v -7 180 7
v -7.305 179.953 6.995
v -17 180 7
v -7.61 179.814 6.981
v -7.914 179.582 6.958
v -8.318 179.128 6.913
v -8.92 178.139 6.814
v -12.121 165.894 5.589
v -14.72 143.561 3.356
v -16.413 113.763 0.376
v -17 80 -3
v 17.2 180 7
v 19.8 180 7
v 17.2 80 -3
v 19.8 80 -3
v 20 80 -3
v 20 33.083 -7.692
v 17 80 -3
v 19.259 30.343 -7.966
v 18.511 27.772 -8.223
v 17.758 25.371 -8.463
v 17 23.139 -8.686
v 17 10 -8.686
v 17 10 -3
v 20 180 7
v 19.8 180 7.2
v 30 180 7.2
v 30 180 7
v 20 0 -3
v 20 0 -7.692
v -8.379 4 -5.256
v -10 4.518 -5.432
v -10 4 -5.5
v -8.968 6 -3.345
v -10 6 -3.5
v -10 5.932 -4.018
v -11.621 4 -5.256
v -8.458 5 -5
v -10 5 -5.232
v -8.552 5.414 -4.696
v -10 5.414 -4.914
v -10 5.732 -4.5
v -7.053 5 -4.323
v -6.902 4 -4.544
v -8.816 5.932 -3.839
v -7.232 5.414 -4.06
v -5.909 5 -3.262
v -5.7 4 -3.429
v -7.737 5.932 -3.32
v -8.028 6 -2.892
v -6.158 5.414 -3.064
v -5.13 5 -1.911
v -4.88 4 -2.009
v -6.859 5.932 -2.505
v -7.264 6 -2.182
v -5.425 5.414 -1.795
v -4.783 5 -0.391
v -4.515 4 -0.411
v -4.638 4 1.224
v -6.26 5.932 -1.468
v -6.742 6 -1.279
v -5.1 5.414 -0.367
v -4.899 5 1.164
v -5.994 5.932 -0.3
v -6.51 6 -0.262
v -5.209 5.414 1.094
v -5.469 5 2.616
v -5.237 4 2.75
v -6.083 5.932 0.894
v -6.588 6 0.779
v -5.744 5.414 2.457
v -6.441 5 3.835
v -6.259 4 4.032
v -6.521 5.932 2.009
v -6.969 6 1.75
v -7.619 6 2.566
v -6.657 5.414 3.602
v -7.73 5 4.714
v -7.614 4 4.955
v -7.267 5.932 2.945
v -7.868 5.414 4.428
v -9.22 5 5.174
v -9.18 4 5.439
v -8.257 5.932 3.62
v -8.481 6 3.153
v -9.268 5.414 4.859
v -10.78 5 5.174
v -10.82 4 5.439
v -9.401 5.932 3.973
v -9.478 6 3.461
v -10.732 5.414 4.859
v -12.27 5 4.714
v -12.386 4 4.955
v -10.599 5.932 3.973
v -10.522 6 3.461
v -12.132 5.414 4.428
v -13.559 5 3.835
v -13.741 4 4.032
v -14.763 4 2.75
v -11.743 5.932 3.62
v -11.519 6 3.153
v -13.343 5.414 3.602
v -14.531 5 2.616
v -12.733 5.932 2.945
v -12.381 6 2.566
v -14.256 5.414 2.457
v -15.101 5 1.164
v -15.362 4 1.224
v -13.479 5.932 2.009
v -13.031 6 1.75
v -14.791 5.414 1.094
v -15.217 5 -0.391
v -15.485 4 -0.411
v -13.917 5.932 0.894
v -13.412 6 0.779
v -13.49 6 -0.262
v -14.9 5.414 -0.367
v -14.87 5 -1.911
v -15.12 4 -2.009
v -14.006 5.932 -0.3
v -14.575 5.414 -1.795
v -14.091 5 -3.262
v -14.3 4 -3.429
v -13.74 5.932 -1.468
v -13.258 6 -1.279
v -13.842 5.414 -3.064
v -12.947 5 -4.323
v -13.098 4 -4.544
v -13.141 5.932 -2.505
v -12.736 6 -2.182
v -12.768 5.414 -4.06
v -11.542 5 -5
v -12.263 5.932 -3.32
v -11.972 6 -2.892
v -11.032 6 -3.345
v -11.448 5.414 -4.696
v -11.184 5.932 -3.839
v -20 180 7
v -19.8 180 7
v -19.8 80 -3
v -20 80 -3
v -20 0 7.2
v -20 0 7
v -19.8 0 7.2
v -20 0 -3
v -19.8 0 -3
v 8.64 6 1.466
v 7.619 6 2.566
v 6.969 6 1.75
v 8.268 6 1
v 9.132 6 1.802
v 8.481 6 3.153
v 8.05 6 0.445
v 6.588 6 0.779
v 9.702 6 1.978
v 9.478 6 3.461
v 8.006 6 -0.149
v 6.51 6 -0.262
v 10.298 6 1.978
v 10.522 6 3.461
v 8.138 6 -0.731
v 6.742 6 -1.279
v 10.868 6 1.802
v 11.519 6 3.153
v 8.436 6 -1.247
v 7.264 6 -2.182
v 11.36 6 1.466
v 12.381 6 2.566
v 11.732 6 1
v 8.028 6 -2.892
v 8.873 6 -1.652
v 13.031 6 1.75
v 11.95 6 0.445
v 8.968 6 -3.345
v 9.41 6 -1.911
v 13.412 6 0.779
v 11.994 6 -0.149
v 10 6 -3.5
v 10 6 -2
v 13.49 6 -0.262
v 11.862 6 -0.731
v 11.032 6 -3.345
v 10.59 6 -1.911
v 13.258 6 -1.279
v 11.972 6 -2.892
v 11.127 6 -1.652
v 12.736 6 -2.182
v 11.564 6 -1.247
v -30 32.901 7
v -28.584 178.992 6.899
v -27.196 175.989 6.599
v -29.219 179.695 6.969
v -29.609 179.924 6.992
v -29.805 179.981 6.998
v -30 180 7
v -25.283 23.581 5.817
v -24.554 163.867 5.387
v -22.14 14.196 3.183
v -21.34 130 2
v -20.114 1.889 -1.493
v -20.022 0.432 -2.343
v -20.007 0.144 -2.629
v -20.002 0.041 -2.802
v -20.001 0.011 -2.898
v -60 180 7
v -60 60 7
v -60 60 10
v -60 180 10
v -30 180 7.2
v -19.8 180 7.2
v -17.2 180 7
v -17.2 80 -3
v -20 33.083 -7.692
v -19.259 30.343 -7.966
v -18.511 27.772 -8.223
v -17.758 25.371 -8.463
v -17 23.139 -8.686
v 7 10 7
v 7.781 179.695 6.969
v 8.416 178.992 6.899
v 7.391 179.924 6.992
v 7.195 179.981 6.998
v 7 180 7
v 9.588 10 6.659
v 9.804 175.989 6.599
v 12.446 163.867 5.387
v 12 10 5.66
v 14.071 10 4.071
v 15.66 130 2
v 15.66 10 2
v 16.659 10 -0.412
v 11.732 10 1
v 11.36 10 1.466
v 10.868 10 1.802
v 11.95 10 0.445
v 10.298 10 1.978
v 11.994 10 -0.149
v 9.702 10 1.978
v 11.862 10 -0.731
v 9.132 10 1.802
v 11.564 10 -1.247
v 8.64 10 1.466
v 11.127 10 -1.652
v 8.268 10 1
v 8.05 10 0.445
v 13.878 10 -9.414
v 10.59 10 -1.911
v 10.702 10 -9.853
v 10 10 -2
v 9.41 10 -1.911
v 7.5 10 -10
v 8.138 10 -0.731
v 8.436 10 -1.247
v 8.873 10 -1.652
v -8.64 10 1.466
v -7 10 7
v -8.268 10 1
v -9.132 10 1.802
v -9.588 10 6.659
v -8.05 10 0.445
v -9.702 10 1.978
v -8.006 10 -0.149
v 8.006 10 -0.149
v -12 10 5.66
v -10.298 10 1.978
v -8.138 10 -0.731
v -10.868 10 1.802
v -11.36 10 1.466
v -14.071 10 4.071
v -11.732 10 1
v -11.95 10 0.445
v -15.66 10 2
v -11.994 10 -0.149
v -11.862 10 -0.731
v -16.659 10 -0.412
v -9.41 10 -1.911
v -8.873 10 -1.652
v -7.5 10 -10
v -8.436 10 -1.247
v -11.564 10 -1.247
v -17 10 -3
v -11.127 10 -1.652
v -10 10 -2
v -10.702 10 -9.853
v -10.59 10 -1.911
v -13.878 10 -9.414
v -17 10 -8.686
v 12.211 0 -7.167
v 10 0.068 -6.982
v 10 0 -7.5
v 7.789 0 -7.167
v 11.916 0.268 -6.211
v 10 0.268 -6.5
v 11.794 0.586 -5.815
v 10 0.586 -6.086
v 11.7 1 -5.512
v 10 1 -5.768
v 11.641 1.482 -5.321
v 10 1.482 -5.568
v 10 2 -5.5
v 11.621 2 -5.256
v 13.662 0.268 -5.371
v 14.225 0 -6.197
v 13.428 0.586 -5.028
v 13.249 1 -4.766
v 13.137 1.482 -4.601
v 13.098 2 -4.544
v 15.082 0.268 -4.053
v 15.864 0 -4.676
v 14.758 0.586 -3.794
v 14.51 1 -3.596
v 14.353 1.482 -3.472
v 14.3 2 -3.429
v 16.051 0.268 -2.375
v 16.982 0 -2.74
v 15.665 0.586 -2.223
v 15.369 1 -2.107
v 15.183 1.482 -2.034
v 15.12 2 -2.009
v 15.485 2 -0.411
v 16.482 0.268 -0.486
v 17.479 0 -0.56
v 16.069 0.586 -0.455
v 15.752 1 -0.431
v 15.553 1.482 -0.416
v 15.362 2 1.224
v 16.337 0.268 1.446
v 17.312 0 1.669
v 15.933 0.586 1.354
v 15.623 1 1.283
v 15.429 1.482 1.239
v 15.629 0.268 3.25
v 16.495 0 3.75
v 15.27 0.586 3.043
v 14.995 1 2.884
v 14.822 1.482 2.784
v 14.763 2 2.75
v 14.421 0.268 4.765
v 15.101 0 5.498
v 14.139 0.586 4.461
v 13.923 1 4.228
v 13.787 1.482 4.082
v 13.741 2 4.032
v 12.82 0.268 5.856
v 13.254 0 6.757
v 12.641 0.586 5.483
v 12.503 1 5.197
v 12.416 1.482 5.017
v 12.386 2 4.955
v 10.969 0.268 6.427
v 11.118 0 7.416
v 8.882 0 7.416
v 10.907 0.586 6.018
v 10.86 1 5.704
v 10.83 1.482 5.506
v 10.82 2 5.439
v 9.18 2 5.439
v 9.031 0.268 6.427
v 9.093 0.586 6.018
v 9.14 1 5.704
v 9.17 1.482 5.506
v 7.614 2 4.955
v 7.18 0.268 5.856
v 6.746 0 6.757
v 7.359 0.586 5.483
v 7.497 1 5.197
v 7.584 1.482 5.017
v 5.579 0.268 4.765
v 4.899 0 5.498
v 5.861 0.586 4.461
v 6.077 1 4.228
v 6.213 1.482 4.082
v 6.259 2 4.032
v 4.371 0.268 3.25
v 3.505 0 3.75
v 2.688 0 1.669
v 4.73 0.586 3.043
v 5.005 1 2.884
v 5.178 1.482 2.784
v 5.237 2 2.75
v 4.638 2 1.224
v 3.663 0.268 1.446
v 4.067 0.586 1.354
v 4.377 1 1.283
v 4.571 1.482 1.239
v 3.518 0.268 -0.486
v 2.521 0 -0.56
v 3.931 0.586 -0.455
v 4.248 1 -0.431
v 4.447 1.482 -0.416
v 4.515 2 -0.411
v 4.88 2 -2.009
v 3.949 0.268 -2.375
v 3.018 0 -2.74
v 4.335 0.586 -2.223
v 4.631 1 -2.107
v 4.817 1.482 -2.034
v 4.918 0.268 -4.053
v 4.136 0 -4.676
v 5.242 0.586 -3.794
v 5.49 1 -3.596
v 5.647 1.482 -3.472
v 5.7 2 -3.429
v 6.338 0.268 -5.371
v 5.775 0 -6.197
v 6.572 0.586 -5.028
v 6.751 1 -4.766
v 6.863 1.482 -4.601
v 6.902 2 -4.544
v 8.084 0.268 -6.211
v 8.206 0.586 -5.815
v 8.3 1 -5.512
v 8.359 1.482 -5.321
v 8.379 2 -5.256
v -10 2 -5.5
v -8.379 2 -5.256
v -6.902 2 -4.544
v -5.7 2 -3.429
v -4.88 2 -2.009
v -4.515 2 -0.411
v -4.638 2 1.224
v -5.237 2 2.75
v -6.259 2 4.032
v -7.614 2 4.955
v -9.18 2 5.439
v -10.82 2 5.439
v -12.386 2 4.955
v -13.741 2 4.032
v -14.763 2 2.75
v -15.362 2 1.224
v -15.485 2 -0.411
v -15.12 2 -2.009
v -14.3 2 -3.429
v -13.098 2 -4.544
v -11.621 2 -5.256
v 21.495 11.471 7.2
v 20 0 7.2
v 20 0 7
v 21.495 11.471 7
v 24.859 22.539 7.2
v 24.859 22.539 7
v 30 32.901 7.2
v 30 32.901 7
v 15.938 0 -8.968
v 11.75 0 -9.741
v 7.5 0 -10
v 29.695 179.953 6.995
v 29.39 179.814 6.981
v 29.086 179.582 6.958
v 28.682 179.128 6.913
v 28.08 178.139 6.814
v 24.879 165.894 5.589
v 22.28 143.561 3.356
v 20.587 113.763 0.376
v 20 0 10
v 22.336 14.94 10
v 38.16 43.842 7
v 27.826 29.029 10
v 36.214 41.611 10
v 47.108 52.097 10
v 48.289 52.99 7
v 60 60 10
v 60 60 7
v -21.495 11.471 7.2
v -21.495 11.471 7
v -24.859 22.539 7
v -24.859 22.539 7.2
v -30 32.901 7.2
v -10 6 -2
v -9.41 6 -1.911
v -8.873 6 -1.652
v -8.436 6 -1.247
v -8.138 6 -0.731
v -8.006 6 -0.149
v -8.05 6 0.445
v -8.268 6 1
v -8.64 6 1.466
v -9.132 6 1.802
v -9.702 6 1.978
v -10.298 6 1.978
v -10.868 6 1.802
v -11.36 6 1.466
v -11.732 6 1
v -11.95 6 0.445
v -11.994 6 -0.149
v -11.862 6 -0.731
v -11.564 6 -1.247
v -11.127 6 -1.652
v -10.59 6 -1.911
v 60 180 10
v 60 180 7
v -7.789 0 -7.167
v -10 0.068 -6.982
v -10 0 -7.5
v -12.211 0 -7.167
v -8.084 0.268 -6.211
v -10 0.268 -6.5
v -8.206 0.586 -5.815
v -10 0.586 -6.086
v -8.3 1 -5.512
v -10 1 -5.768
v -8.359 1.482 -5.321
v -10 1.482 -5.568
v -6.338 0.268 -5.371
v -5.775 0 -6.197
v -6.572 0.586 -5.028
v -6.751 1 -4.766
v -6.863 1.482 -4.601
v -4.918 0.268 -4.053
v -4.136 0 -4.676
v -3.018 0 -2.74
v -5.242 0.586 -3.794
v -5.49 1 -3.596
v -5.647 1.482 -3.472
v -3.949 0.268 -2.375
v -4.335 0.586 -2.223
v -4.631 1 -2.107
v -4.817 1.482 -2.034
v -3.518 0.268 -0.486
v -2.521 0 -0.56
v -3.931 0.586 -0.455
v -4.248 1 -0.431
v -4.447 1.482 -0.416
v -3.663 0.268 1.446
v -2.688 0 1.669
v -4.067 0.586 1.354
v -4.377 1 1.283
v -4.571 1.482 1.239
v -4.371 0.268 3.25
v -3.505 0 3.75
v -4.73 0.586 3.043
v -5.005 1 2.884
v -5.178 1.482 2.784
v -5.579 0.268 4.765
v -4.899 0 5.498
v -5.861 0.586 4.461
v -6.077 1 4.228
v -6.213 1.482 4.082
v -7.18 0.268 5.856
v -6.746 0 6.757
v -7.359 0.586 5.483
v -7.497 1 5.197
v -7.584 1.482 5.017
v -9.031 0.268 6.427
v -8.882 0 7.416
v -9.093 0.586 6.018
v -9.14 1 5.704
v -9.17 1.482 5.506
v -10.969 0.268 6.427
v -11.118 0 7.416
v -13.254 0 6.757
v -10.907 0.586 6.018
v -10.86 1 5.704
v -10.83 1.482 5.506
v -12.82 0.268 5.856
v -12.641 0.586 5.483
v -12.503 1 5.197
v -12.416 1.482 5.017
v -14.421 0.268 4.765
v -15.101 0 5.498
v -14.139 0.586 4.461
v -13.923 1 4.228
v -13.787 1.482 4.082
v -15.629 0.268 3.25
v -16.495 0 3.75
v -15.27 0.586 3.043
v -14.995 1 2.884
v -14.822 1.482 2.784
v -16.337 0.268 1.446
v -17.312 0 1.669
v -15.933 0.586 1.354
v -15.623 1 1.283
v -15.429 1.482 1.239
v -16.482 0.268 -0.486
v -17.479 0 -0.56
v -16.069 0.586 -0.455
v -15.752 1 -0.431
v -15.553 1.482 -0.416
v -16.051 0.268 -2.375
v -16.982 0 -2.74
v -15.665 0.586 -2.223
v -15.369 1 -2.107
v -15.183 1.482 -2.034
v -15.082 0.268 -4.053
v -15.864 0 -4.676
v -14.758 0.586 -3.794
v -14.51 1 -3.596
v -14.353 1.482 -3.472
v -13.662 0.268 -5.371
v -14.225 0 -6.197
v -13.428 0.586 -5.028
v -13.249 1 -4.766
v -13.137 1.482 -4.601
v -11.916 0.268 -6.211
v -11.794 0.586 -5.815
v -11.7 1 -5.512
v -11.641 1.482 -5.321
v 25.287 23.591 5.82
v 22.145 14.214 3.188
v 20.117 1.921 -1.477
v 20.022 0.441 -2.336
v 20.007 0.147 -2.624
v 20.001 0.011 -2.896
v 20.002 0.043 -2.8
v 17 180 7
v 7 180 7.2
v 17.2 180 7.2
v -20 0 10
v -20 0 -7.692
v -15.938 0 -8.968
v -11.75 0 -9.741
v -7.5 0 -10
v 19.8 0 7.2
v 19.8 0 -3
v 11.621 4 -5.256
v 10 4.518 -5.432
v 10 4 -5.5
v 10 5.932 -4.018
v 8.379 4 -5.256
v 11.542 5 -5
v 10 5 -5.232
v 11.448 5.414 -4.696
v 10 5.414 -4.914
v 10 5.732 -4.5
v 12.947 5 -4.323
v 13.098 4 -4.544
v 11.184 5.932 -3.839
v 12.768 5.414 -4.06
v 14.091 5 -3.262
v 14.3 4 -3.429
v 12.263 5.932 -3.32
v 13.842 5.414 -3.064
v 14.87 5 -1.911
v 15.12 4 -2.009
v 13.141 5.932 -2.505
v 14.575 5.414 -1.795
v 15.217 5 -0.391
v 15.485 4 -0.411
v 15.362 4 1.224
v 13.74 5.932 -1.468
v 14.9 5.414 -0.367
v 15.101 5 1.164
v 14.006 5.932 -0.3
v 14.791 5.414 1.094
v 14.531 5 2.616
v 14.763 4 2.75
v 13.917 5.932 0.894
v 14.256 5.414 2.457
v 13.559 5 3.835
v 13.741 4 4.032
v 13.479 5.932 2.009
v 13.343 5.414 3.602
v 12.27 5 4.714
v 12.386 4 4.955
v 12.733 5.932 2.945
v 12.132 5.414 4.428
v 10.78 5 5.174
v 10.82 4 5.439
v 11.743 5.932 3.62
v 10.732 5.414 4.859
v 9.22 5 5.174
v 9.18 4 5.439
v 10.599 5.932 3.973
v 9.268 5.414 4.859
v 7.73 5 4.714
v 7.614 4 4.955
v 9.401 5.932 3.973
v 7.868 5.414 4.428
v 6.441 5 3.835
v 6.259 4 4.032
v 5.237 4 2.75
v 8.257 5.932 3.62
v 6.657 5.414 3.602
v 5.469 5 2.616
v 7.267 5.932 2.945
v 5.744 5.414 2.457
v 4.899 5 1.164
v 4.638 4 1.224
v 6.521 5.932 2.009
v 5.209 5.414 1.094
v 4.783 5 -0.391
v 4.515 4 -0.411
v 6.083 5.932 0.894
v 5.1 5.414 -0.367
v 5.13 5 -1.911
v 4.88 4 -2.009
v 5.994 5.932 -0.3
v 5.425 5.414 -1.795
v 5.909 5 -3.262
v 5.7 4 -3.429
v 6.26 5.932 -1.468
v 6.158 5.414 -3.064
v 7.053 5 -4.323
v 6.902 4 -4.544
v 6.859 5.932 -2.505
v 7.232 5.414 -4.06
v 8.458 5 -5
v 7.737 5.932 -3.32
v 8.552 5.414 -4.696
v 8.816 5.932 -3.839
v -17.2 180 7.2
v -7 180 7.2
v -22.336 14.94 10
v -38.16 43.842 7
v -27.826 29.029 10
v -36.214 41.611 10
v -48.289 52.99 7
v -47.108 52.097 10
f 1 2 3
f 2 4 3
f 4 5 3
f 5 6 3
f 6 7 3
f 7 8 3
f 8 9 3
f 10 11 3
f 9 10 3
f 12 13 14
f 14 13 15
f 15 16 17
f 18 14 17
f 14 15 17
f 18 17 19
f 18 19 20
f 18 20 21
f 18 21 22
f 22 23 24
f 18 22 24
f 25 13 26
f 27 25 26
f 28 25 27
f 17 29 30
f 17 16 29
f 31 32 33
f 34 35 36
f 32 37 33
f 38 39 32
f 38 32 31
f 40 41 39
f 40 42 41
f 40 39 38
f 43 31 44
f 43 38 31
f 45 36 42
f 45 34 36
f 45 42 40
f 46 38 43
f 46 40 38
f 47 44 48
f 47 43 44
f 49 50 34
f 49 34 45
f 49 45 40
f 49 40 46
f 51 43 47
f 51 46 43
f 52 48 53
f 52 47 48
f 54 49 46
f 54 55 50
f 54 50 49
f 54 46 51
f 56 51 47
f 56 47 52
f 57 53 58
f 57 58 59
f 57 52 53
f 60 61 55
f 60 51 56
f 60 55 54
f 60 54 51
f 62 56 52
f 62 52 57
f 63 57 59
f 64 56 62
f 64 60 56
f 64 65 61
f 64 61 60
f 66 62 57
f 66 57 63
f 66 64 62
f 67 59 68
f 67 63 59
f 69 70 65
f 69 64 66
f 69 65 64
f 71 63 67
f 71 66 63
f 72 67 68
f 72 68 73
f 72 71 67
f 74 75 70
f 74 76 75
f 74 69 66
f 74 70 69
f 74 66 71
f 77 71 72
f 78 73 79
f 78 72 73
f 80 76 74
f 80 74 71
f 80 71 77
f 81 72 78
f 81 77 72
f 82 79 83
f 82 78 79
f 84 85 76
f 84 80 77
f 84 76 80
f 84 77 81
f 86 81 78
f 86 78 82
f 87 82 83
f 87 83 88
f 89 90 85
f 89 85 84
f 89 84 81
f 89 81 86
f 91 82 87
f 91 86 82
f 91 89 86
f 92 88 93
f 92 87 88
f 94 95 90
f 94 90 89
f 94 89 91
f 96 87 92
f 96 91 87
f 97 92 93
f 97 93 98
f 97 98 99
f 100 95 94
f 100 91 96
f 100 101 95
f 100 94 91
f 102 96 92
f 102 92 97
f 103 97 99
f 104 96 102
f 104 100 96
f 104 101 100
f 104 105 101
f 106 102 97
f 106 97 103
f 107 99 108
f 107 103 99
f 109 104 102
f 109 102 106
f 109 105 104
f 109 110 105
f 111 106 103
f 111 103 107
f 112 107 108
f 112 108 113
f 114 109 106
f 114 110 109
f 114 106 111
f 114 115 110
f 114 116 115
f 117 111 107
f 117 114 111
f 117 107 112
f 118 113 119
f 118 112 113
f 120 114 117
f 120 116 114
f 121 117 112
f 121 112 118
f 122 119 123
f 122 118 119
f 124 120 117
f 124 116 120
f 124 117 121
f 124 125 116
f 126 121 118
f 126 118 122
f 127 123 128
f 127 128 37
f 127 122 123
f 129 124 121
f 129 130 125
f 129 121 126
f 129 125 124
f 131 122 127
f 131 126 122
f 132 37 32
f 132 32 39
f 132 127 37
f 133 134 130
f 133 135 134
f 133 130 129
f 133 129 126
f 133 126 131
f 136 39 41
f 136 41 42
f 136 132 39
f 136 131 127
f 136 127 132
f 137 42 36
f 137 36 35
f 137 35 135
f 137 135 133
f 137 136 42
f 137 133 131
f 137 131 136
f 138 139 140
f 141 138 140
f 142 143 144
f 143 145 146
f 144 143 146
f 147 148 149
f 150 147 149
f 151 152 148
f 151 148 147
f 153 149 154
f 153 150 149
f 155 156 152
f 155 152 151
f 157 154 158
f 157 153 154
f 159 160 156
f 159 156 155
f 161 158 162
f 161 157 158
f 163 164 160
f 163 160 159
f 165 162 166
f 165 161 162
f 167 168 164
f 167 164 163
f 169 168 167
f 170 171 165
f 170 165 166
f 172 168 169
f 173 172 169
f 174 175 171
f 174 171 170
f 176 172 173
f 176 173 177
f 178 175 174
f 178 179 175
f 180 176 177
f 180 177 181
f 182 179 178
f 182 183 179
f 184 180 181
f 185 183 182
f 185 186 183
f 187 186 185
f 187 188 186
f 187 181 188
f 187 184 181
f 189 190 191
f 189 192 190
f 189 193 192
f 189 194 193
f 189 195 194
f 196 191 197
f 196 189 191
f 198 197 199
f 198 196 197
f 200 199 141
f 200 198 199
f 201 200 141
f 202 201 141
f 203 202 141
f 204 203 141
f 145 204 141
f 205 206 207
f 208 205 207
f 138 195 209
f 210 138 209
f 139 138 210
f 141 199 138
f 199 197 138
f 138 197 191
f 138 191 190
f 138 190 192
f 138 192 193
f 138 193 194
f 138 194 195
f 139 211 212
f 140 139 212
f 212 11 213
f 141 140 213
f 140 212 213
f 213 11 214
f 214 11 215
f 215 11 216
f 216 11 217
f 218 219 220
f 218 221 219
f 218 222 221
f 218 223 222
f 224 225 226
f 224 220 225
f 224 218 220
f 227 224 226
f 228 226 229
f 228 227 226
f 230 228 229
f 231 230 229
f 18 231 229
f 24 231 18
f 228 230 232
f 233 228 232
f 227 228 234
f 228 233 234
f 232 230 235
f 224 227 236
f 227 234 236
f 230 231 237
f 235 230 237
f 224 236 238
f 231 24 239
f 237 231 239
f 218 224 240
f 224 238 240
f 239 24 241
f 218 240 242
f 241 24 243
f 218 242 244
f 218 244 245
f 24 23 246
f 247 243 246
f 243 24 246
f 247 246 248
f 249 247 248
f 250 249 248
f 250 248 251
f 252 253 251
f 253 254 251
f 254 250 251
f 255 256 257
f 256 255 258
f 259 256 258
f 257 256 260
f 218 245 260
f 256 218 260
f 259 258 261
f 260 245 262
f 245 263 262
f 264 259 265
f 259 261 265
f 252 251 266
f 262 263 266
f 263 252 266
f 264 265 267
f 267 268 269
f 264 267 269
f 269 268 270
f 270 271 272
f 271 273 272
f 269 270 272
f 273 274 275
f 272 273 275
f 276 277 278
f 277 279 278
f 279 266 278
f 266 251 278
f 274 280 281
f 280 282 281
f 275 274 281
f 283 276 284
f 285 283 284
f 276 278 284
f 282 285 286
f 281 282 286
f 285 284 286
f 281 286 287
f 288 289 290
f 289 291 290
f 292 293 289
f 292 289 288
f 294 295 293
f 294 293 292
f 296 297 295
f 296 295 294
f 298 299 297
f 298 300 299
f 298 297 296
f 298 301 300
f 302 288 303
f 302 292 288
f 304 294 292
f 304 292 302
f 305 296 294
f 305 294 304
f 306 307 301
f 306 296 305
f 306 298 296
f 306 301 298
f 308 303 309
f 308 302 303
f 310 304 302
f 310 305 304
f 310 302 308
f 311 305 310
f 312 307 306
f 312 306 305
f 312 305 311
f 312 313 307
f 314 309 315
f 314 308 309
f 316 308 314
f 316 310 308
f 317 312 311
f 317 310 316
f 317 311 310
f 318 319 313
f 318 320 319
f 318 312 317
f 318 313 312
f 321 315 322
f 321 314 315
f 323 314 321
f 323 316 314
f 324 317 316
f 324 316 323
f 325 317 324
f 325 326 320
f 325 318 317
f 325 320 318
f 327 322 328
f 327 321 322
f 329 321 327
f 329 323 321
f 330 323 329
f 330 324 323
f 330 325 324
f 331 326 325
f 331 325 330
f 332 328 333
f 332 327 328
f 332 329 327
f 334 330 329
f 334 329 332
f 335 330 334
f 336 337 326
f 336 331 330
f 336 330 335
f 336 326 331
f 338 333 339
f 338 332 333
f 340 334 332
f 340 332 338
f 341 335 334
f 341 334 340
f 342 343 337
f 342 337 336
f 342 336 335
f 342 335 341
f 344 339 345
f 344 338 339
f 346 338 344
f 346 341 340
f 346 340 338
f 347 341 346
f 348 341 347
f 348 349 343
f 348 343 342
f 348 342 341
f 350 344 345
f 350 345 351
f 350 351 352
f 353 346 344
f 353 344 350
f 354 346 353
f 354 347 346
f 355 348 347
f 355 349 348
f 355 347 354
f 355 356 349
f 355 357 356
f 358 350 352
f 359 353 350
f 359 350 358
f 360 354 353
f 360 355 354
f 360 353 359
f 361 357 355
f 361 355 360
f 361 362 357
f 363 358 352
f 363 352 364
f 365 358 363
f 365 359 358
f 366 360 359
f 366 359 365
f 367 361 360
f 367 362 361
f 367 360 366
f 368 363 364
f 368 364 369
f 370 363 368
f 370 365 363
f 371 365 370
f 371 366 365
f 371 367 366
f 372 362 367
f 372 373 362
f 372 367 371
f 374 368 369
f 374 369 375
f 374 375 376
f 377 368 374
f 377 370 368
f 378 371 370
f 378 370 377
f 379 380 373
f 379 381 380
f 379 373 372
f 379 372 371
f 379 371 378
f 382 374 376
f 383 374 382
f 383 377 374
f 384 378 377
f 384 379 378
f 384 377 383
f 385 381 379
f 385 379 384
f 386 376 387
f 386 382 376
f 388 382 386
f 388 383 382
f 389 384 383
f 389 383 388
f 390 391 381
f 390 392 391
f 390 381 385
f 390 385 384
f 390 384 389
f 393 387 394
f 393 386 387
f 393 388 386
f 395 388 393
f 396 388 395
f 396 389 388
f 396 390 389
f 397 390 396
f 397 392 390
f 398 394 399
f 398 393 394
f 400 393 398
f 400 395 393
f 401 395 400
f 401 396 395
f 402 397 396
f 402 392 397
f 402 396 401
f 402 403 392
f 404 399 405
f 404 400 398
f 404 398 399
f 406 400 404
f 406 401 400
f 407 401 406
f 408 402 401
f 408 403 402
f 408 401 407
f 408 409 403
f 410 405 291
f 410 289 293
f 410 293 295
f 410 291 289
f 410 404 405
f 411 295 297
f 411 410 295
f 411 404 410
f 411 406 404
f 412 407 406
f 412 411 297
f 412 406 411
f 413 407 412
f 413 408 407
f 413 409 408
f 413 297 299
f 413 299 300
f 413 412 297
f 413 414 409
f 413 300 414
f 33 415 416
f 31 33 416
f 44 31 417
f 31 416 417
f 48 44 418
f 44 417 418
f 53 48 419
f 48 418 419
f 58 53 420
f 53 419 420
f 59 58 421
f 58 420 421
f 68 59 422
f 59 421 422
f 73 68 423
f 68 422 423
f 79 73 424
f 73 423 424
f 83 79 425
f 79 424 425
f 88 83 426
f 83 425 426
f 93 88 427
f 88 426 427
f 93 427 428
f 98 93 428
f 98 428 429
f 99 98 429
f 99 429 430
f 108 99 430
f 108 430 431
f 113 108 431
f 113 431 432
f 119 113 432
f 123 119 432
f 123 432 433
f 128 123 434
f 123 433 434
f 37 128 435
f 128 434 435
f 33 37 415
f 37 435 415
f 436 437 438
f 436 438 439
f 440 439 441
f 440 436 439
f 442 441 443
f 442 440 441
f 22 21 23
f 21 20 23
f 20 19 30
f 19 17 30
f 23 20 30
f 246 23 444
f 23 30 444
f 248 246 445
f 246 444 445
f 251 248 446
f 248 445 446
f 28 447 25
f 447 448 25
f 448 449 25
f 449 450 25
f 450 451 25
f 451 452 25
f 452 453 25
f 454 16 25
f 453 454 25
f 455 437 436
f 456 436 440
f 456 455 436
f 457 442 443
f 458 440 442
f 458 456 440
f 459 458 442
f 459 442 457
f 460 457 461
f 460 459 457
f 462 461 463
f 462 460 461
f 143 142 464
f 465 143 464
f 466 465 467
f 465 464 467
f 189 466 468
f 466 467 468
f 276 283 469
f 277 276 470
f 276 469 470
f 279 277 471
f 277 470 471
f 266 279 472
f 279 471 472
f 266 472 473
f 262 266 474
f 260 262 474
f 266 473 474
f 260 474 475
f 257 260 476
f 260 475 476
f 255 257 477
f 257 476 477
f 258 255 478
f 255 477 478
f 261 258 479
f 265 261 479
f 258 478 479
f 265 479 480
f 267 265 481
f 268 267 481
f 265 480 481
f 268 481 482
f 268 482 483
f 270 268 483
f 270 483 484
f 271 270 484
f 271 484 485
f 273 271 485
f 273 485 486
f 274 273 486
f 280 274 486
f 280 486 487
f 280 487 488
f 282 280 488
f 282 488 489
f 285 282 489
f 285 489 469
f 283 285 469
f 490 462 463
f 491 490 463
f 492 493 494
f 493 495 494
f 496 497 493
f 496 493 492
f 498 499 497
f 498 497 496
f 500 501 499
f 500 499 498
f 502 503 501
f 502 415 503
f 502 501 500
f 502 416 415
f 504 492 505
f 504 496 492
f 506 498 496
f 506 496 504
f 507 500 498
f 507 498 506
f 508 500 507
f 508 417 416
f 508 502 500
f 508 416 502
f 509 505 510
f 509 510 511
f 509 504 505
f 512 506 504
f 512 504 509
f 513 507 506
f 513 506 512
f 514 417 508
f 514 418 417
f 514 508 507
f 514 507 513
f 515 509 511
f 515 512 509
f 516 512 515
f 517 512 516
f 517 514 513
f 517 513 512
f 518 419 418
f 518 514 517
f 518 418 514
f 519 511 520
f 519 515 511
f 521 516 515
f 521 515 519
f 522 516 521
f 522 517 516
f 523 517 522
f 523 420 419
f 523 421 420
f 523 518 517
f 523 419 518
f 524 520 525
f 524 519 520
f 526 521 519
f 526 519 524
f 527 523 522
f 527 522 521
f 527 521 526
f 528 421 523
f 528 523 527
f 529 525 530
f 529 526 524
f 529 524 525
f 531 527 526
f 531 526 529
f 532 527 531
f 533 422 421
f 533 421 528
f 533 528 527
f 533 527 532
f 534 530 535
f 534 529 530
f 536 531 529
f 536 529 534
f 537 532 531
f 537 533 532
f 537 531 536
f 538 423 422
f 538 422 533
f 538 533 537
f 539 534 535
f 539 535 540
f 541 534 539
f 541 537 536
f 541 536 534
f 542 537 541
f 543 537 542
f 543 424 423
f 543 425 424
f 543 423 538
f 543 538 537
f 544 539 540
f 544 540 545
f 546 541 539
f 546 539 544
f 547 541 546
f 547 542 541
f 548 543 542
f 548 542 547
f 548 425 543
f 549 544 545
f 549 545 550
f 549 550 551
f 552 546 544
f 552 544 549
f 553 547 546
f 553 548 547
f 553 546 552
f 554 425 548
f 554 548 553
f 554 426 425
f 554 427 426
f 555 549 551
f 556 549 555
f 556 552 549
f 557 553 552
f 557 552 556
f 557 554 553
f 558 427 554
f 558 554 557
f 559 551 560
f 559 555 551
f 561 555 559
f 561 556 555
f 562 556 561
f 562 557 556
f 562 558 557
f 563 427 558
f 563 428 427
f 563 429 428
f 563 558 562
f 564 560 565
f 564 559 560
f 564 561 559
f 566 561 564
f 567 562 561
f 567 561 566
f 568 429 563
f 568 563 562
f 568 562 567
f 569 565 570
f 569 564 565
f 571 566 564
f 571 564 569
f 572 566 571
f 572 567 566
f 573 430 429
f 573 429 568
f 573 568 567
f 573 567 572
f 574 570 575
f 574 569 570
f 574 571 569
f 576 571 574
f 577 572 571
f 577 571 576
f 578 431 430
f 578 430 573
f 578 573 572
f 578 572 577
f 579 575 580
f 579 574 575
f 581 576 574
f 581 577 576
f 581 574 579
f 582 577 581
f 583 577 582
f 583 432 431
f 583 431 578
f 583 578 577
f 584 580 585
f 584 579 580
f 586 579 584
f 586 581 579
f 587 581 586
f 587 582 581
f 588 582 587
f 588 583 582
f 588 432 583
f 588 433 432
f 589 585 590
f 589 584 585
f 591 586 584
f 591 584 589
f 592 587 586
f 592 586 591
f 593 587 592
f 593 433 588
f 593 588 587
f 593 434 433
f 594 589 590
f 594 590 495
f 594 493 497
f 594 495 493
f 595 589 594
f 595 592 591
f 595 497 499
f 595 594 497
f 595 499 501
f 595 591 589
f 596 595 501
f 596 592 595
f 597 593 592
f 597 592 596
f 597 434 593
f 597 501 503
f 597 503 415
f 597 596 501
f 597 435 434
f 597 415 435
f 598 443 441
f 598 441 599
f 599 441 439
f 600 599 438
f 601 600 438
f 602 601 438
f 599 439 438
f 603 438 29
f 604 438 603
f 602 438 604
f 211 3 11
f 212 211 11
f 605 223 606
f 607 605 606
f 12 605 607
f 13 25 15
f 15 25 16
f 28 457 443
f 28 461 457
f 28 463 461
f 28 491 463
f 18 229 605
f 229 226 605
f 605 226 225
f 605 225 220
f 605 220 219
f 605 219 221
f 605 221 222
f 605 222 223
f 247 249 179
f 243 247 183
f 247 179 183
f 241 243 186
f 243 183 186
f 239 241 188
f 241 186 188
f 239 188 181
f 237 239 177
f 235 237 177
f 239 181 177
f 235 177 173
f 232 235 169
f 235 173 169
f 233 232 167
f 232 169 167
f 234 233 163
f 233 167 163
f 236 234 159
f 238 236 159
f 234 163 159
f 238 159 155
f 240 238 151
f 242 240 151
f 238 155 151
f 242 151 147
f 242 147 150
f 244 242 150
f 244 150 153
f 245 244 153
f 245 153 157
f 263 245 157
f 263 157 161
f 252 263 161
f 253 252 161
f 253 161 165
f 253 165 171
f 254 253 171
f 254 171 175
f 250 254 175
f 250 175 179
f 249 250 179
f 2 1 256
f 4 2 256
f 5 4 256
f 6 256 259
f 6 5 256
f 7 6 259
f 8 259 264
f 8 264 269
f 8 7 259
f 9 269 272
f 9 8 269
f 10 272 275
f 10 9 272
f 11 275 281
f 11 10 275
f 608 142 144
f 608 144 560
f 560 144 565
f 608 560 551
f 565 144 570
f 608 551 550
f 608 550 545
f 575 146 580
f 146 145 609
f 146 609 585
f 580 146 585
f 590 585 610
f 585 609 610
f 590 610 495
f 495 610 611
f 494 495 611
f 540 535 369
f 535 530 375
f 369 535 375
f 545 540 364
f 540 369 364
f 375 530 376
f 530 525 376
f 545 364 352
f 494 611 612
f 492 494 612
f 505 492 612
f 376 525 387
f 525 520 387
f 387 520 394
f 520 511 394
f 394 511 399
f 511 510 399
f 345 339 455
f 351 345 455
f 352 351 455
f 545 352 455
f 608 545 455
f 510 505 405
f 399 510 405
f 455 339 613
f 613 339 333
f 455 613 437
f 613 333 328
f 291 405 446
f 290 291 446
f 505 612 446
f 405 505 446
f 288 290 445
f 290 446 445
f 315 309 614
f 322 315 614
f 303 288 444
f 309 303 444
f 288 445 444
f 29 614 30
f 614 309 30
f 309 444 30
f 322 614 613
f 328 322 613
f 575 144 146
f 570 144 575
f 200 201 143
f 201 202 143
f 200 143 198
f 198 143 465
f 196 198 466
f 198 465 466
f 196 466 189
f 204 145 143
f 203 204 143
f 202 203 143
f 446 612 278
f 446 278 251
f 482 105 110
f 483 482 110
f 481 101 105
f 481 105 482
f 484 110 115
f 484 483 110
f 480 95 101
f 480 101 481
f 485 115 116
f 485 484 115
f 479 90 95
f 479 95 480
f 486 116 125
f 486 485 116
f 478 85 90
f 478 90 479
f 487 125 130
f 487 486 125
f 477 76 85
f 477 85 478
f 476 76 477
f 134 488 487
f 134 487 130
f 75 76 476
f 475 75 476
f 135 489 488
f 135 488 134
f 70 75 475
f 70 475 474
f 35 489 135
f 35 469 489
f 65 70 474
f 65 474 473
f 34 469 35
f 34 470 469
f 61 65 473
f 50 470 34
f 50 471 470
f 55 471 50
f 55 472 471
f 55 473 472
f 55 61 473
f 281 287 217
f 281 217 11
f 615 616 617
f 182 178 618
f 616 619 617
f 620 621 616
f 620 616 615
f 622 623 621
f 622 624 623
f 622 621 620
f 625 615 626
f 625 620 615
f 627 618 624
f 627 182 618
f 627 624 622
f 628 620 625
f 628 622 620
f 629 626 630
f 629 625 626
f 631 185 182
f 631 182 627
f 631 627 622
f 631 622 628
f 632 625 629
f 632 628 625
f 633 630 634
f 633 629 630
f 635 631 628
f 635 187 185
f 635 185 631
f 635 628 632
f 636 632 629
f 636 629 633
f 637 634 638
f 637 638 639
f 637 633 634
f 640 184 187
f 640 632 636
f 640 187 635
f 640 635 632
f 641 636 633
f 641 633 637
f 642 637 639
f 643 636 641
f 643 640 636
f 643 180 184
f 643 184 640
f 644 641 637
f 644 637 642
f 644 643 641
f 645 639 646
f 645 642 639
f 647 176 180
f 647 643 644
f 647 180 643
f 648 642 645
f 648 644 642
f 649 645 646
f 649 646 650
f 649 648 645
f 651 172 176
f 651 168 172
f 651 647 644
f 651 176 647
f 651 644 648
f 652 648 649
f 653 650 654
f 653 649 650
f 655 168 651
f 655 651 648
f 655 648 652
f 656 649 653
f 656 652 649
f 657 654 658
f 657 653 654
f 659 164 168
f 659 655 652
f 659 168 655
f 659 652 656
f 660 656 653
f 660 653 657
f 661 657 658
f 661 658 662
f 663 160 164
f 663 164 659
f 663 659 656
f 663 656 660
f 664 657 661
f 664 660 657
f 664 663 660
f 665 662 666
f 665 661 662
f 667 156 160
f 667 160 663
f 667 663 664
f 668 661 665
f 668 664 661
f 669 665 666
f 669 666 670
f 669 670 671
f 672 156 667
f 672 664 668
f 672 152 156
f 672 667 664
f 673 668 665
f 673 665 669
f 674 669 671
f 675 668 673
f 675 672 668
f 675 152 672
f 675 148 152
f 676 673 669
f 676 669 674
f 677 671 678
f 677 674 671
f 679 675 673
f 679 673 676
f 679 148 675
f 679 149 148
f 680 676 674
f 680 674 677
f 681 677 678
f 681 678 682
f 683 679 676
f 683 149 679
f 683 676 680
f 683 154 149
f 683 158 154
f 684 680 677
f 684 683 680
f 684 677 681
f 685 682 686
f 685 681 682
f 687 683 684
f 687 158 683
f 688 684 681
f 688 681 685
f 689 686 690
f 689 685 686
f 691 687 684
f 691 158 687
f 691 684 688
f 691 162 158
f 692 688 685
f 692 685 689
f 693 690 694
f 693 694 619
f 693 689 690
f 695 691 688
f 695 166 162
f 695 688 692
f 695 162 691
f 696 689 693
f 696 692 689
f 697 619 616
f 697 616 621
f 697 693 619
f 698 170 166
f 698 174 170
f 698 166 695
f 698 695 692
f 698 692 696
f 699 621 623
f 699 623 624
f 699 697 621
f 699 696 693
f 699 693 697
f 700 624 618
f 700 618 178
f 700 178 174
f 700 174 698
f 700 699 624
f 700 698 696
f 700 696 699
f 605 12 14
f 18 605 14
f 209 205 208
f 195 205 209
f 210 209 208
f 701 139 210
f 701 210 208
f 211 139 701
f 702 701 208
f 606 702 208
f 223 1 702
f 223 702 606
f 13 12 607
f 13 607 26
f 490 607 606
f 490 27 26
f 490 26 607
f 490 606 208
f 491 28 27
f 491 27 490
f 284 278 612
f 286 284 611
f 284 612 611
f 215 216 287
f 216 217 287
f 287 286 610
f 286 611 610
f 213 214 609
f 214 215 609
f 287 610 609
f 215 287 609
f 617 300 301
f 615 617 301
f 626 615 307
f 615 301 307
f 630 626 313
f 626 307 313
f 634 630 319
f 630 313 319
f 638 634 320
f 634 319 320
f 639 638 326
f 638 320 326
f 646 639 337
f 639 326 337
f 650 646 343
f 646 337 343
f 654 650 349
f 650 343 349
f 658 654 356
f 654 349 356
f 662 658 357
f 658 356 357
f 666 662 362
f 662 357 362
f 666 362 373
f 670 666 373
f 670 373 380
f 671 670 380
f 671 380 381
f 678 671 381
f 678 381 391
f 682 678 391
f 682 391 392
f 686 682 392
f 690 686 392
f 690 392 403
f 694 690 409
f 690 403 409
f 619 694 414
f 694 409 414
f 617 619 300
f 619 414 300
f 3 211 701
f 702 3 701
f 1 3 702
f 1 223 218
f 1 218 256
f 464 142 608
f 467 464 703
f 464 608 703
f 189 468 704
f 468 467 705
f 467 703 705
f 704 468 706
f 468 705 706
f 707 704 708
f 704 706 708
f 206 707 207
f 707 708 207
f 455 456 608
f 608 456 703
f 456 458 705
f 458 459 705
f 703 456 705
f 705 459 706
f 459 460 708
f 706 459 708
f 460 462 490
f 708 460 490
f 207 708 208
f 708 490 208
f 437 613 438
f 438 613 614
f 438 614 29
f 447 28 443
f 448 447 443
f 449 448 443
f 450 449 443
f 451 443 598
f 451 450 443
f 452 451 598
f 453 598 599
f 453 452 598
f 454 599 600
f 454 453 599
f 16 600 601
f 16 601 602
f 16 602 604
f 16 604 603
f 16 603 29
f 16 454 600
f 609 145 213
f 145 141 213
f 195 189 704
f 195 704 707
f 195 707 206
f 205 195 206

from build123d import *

# Parameters (mm, degrees)
SZKIC1_W                    = 40
SZKIC1_H                    = 20
DODANIE_WYCI_GNI_CIE1_DEPTH = 60
DODANIE_WYCI_GNI_CIE2_DEPTH = 120
DODANIE_WYCI_GNI_CIE3_DEPTH = 3
SZKIC4_W                    = 40
SZKIC4_H                    = 17
DODANIE_WYCI_GNI_CIE4_DEPTH = 120
WYTNIJ_WYCI_GNI_CIE1_DEPTH  = 40
SZKIC6_W                    = 34
SZKIC6_H                    = 170
WYTNIJ_WYCI_GNI_CIE2_DEPTH  = 17
ZAOKR_GLENIE1_R             = 10
SZKIC7_R                    = 2
WYTNIJ_WYCI_GNI_CIE3_DEPTH  = 10
SZKIC8_R                    = 5.5
WYTNIJ_WYCI_GNI_CIE4_DEPTH  = 6
ZAOKR_GLENIE2_R             = 2
WYTNIJ_WYCI_GNI_CIE5_DEPTH  = 191.000000132


with BuildPart() as part:
    # Szkic1 → Dodanie-wyciągnięcie1 (new body)
    with BuildSketch(Plane(origin=(0, 0, 0), x_dir=(1, 0, 0), z_dir=(0, 1, 0))):
        Rectangle(SZKIC1_W, SZKIC1_H)
    extrude(amount=DODANIE_WYCI_GNI_CIE1_DEPTH)

    # Szkic2 → Dodanie-wyciągnięcie2 (add)
    with BuildSketch(Plane(origin=(0, 60, 0), x_dir=(1, 0, 0), z_dir=(0, 1, 0))):
        Polygon((0, -10), (60, -10), (60, -7), (-60, -7), (-60, -10), align=None)
    extrude(amount=DODANIE_WYCI_GNI_CIE2_DEPTH)

    # Szkic3 → Dodanie-wyciągnięcie3 (add)
    with BuildSketch(Plane.XY.offset(10)):
        with BuildLine():
            Line((-60, 60), (-20, 60))
            Line((-20, 60), (-20, 0))
            ThreePointArc((-20, 0), (-31.679497057, 35.547001962), (-60, 60))
        make_face()
        with BuildLine():
            Line((60, 60), (20, 60))
            Line((20, 60), (20, 0))
            ThreePointArc((20, 0), (31.679497057, 35.547001962), (60, 60))
        make_face()
    extrude(amount=-DODANIE_WYCI_GNI_CIE3_DEPTH)

    # Szkic4 → Dodanie-wyciągnięcie4 (add)
    with BuildSketch(Plane(origin=(0, 60, 0), x_dir=(1, 0, 0), z_dir=(0, 1, 0))):
        with Locations((0, 1.5)):
            Rectangle(SZKIC4_W, SZKIC4_H)
    extrude(amount=DODANIE_WYCI_GNI_CIE4_DEPTH)

    # Szkic5 → Wytnij-wyciągnięcie1 (cut)
    with BuildSketch(Plane(origin=(20, 0, 0), x_dir=(0, 0, -1), z_dir=(1, 0, 0))):
        Polygon((-7, 180), (10, 10), (18.124176292, 10), (18.124176292, 180), align=None)
    extrude(amount=-WYTNIJ_WYCI_GNI_CIE1_DEPTH, mode=Mode.SUBTRACT)

    # Szkic6 → Wytnij-wyciągnięcie2 (cut)
    with BuildSketch(Plane(origin=(0, 0, -10), x_dir=(-1, 0, 0), z_dir=(0, 0, -1))):
        with Locations((0, 95)):
            Rectangle(SZKIC6_W, SZKIC6_H)
    extrude(amount=-WYTNIJ_WYCI_GNI_CIE2_DEPTH, mode=Mode.SUBTRACT)

    # Zaokrąglenie1
    # the kernel refuses this fillet: 10 mm, written as the material it adds along each edge
    with BuildSketch(Plane(origin=(-20, 0, 7), x_dir=(0, 0, -1), z_dir=(0, 1, 0))) as zaokr_glenie1_piece_1_section:
        with BuildLine():
            CenterArc((ZAOKR_GLENIE1_R, ZAOKR_GLENIE1_R), ZAOKR_GLENIE1_R, 180, 90)
            Line((0, ZAOKR_GLENIE1_R), (-ZAOKR_GLENIE1_R * 0.02, ZAOKR_GLENIE1_R))
            Line((-ZAOKR_GLENIE1_R * 0.02, ZAOKR_GLENIE1_R), (-ZAOKR_GLENIE1_R * 0.02, -ZAOKR_GLENIE1_R * 0.02))
            Line((-ZAOKR_GLENIE1_R * 0.02, -ZAOKR_GLENIE1_R * 0.02), (ZAOKR_GLENIE1_R, -ZAOKR_GLENIE1_R * 0.02))
            Line((ZAOKR_GLENIE1_R, -ZAOKR_GLENIE1_R * 0.02), (ZAOKR_GLENIE1_R, 0))
        make_face()
    zaokr_glenie1_piece_1 = extrude(amount=180, mode=Mode.PRIVATE)
    zaokr_glenie1_piece_1 = split(zaokr_glenie1_piece_1, bisect_by=Plane(origin=(-22.33425107, 87.013829457, -2.298617054), z_dir=(0, -0.09950371902099896, 0.9950371902099892)), keep=Keep.TOP, mode=Mode.PRIVATE)
    zaokr_glenie1_piece_1 = zaokr_glenie1_piece_1 - Plane(origin=(-89.92301766, -3.282011774, 4.977489049), x_dir=(0.9989002522895803, 0.04688588247876816, 0), z_dir=(0, 0, 1)) * Cylinder(70, 400, mode=Mode.PRIVATE)
    with BuildSketch(Plane(origin=(20, 180, 7), x_dir=(0, 0, -1), z_dir=(0, -1, 0))) as zaokr_glenie1_piece_2_section:
        with BuildLine():
            CenterArc((ZAOKR_GLENIE1_R, ZAOKR_GLENIE1_R), ZAOKR_GLENIE1_R, 180, 90)
            Line((0, ZAOKR_GLENIE1_R), (-ZAOKR_GLENIE1_R * 0.02, ZAOKR_GLENIE1_R))
            Line((-ZAOKR_GLENIE1_R * 0.02, ZAOKR_GLENIE1_R), (-ZAOKR_GLENIE1_R * 0.02, -ZAOKR_GLENIE1_R * 0.02))
            Line((-ZAOKR_GLENIE1_R * 0.02, -ZAOKR_GLENIE1_R * 0.02), (ZAOKR_GLENIE1_R, -ZAOKR_GLENIE1_R * 0.02))
            Line((ZAOKR_GLENIE1_R, -ZAOKR_GLENIE1_R * 0.02), (ZAOKR_GLENIE1_R, 0))
        make_face()
    zaokr_glenie1_piece_2 = extrude(amount=180, mode=Mode.PRIVATE)
    zaokr_glenie1_piece_2 = split(zaokr_glenie1_piece_2, bisect_by=Plane(origin=(22.33425107, 87.013829456, -2.298617054), z_dir=(0, -0.09950371902099896, 0.9950371902099892)), keep=Keep.TOP, mode=Mode.PRIVATE)
    zaokr_glenie1_piece_2 = zaokr_glenie1_piece_2 - Plane(origin=(89.92301766, -3.282011774, 4.977489049), x_dir=(-0.9989002522895803, 0.046885882478767064, 0), z_dir=(0, 0, 1)) * Cylinder(70, 400, mode=Mode.PRIVATE)
    with BuildSketch(Plane(origin=(-17, 180, 7), x_dir=(0, 0, -1), z_dir=(0, -1, 0))) as zaokr_glenie1_piece_3_section:
        with BuildLine():
            CenterArc((ZAOKR_GLENIE1_R, ZAOKR_GLENIE1_R), ZAOKR_GLENIE1_R, 180, 90)
            Line((0, ZAOKR_GLENIE1_R), (-ZAOKR_GLENIE1_R * 0.02, ZAOKR_GLENIE1_R))
            Line((-ZAOKR_GLENIE1_R * 0.02, ZAOKR_GLENIE1_R), (-ZAOKR_GLENIE1_R * 0.02, -ZAOKR_GLENIE1_R * 0.02))
            Line((-ZAOKR_GLENIE1_R * 0.02, -ZAOKR_GLENIE1_R * 0.02), (ZAOKR_GLENIE1_R, -ZAOKR_GLENIE1_R * 0.02))
            Line((ZAOKR_GLENIE1_R, -ZAOKR_GLENIE1_R * 0.02), (ZAOKR_GLENIE1_R, 0))
        make_face()
    zaokr_glenie1_piece_3 = extrude(amount=170, mode=Mode.PRIVATE)
    zaokr_glenie1_piece_3 = split(zaokr_glenie1_piece_3, bisect_by=Plane(origin=(-14.551056072, 85.950912881, -2.404908712), z_dir=(0, -0.09950371902099896, 0.9950371902099892)), keep=Keep.TOP, mode=Mode.PRIVATE)
    with BuildSketch(Plane(origin=(17, 10, 7), x_dir=(0, 0, -1), z_dir=(0, 1, 0))) as zaokr_glenie1_piece_4_section:
        with BuildLine():
            CenterArc((ZAOKR_GLENIE1_R, ZAOKR_GLENIE1_R), ZAOKR_GLENIE1_R, 180, 90)
            Line((0, ZAOKR_GLENIE1_R), (-ZAOKR_GLENIE1_R * 0.02, ZAOKR_GLENIE1_R))
            Line((-ZAOKR_GLENIE1_R * 0.02, ZAOKR_GLENIE1_R), (-ZAOKR_GLENIE1_R * 0.02, -ZAOKR_GLENIE1_R * 0.02))
            Line((-ZAOKR_GLENIE1_R * 0.02, -ZAOKR_GLENIE1_R * 0.02), (ZAOKR_GLENIE1_R, -ZAOKR_GLENIE1_R * 0.02))
            Line((ZAOKR_GLENIE1_R, -ZAOKR_GLENIE1_R * 0.02), (ZAOKR_GLENIE1_R, 0))
        make_face()
    zaokr_glenie1_piece_4 = extrude(amount=170, mode=Mode.PRIVATE)
    zaokr_glenie1_piece_4 = split(zaokr_glenie1_piece_4, bisect_by=Plane(origin=(14.551056072, 85.950912881, -2.404908712), z_dir=(0, -0.09950371902099896, 0.9950371902099892)), keep=Keep.TOP, mode=Mode.PRIVATE)
    add([zaokr_glenie1_piece_1, zaokr_glenie1_piece_2, zaokr_glenie1_piece_3, zaokr_glenie1_piece_4])

    # Szkic7 → Wytnij-wyciągnięcie3 (cut)
    with BuildSketch(Plane.XZ):
        with Locations(Location((-10, 0, 0), (0, 0, 270))):
            Circle(SZKIC7_R)
        with Locations(Location((10, 0, 0), (0, 0, 270))):
            Circle(SZKIC7_R)
    extrude(amount=-WYTNIJ_WYCI_GNI_CIE3_DEPTH, mode=Mode.SUBTRACT)

    # Szkic8 → Wytnij-wyciągnięcie4 (cut)
    with BuildSketch(Plane.XZ):
        with Locations(Location((-10, 0, 0), (0, 0, 270))):
            Circle(SZKIC8_R)
        with Locations(Location((10, 0, 0), (0, 0, 270))):
            Circle(SZKIC8_R)
    extrude(amount=-WYTNIJ_WYCI_GNI_CIE4_DEPTH, mode=Mode.SUBTRACT)

    # Zaokrąglenie2
    zaokr_glenie2_edges = [part.edges().sort_by_distance(p)[0] for p in [
        (-10, 0, 5.5),
        (-10, 6, 5.5),
        (10, 0, 5.5),
        (10, 6, 5.5),
    ]]
    fillet(zaokr_glenie2_edges, radius=ZAOKR_GLENIE2_R)

    # Szkic9 → Wytnij-wyciągnięcie5 (cut, through all)
    with BuildSketch(Plane.XZ):
        with BuildLine():
            Line((7.5, -10), (-7.5, -10))
            ThreePointArc((-7.5, -10), (-20.893920133, -7.335783638), (-32.248737342, 0.251262658))
            Line((-32.248737342, 0.251262658), (-32.248737342, -13.02318051))
            Line((-32.248737342, -13.02318051), (32.248737342, -13.02318051))
            Line((32.248737342, -13.02318051), (32.248737342, 0.251262658))
            ThreePointArc((32.248737342, 0.251262658), (20.893920133, -7.335783638), (7.5, -10))
        make_face()
    extrude(amount=-WYTNIJ_WYCI_GNI_CIE5_DEPTH, mode=Mode.SUBTRACT)


solid = part.part
